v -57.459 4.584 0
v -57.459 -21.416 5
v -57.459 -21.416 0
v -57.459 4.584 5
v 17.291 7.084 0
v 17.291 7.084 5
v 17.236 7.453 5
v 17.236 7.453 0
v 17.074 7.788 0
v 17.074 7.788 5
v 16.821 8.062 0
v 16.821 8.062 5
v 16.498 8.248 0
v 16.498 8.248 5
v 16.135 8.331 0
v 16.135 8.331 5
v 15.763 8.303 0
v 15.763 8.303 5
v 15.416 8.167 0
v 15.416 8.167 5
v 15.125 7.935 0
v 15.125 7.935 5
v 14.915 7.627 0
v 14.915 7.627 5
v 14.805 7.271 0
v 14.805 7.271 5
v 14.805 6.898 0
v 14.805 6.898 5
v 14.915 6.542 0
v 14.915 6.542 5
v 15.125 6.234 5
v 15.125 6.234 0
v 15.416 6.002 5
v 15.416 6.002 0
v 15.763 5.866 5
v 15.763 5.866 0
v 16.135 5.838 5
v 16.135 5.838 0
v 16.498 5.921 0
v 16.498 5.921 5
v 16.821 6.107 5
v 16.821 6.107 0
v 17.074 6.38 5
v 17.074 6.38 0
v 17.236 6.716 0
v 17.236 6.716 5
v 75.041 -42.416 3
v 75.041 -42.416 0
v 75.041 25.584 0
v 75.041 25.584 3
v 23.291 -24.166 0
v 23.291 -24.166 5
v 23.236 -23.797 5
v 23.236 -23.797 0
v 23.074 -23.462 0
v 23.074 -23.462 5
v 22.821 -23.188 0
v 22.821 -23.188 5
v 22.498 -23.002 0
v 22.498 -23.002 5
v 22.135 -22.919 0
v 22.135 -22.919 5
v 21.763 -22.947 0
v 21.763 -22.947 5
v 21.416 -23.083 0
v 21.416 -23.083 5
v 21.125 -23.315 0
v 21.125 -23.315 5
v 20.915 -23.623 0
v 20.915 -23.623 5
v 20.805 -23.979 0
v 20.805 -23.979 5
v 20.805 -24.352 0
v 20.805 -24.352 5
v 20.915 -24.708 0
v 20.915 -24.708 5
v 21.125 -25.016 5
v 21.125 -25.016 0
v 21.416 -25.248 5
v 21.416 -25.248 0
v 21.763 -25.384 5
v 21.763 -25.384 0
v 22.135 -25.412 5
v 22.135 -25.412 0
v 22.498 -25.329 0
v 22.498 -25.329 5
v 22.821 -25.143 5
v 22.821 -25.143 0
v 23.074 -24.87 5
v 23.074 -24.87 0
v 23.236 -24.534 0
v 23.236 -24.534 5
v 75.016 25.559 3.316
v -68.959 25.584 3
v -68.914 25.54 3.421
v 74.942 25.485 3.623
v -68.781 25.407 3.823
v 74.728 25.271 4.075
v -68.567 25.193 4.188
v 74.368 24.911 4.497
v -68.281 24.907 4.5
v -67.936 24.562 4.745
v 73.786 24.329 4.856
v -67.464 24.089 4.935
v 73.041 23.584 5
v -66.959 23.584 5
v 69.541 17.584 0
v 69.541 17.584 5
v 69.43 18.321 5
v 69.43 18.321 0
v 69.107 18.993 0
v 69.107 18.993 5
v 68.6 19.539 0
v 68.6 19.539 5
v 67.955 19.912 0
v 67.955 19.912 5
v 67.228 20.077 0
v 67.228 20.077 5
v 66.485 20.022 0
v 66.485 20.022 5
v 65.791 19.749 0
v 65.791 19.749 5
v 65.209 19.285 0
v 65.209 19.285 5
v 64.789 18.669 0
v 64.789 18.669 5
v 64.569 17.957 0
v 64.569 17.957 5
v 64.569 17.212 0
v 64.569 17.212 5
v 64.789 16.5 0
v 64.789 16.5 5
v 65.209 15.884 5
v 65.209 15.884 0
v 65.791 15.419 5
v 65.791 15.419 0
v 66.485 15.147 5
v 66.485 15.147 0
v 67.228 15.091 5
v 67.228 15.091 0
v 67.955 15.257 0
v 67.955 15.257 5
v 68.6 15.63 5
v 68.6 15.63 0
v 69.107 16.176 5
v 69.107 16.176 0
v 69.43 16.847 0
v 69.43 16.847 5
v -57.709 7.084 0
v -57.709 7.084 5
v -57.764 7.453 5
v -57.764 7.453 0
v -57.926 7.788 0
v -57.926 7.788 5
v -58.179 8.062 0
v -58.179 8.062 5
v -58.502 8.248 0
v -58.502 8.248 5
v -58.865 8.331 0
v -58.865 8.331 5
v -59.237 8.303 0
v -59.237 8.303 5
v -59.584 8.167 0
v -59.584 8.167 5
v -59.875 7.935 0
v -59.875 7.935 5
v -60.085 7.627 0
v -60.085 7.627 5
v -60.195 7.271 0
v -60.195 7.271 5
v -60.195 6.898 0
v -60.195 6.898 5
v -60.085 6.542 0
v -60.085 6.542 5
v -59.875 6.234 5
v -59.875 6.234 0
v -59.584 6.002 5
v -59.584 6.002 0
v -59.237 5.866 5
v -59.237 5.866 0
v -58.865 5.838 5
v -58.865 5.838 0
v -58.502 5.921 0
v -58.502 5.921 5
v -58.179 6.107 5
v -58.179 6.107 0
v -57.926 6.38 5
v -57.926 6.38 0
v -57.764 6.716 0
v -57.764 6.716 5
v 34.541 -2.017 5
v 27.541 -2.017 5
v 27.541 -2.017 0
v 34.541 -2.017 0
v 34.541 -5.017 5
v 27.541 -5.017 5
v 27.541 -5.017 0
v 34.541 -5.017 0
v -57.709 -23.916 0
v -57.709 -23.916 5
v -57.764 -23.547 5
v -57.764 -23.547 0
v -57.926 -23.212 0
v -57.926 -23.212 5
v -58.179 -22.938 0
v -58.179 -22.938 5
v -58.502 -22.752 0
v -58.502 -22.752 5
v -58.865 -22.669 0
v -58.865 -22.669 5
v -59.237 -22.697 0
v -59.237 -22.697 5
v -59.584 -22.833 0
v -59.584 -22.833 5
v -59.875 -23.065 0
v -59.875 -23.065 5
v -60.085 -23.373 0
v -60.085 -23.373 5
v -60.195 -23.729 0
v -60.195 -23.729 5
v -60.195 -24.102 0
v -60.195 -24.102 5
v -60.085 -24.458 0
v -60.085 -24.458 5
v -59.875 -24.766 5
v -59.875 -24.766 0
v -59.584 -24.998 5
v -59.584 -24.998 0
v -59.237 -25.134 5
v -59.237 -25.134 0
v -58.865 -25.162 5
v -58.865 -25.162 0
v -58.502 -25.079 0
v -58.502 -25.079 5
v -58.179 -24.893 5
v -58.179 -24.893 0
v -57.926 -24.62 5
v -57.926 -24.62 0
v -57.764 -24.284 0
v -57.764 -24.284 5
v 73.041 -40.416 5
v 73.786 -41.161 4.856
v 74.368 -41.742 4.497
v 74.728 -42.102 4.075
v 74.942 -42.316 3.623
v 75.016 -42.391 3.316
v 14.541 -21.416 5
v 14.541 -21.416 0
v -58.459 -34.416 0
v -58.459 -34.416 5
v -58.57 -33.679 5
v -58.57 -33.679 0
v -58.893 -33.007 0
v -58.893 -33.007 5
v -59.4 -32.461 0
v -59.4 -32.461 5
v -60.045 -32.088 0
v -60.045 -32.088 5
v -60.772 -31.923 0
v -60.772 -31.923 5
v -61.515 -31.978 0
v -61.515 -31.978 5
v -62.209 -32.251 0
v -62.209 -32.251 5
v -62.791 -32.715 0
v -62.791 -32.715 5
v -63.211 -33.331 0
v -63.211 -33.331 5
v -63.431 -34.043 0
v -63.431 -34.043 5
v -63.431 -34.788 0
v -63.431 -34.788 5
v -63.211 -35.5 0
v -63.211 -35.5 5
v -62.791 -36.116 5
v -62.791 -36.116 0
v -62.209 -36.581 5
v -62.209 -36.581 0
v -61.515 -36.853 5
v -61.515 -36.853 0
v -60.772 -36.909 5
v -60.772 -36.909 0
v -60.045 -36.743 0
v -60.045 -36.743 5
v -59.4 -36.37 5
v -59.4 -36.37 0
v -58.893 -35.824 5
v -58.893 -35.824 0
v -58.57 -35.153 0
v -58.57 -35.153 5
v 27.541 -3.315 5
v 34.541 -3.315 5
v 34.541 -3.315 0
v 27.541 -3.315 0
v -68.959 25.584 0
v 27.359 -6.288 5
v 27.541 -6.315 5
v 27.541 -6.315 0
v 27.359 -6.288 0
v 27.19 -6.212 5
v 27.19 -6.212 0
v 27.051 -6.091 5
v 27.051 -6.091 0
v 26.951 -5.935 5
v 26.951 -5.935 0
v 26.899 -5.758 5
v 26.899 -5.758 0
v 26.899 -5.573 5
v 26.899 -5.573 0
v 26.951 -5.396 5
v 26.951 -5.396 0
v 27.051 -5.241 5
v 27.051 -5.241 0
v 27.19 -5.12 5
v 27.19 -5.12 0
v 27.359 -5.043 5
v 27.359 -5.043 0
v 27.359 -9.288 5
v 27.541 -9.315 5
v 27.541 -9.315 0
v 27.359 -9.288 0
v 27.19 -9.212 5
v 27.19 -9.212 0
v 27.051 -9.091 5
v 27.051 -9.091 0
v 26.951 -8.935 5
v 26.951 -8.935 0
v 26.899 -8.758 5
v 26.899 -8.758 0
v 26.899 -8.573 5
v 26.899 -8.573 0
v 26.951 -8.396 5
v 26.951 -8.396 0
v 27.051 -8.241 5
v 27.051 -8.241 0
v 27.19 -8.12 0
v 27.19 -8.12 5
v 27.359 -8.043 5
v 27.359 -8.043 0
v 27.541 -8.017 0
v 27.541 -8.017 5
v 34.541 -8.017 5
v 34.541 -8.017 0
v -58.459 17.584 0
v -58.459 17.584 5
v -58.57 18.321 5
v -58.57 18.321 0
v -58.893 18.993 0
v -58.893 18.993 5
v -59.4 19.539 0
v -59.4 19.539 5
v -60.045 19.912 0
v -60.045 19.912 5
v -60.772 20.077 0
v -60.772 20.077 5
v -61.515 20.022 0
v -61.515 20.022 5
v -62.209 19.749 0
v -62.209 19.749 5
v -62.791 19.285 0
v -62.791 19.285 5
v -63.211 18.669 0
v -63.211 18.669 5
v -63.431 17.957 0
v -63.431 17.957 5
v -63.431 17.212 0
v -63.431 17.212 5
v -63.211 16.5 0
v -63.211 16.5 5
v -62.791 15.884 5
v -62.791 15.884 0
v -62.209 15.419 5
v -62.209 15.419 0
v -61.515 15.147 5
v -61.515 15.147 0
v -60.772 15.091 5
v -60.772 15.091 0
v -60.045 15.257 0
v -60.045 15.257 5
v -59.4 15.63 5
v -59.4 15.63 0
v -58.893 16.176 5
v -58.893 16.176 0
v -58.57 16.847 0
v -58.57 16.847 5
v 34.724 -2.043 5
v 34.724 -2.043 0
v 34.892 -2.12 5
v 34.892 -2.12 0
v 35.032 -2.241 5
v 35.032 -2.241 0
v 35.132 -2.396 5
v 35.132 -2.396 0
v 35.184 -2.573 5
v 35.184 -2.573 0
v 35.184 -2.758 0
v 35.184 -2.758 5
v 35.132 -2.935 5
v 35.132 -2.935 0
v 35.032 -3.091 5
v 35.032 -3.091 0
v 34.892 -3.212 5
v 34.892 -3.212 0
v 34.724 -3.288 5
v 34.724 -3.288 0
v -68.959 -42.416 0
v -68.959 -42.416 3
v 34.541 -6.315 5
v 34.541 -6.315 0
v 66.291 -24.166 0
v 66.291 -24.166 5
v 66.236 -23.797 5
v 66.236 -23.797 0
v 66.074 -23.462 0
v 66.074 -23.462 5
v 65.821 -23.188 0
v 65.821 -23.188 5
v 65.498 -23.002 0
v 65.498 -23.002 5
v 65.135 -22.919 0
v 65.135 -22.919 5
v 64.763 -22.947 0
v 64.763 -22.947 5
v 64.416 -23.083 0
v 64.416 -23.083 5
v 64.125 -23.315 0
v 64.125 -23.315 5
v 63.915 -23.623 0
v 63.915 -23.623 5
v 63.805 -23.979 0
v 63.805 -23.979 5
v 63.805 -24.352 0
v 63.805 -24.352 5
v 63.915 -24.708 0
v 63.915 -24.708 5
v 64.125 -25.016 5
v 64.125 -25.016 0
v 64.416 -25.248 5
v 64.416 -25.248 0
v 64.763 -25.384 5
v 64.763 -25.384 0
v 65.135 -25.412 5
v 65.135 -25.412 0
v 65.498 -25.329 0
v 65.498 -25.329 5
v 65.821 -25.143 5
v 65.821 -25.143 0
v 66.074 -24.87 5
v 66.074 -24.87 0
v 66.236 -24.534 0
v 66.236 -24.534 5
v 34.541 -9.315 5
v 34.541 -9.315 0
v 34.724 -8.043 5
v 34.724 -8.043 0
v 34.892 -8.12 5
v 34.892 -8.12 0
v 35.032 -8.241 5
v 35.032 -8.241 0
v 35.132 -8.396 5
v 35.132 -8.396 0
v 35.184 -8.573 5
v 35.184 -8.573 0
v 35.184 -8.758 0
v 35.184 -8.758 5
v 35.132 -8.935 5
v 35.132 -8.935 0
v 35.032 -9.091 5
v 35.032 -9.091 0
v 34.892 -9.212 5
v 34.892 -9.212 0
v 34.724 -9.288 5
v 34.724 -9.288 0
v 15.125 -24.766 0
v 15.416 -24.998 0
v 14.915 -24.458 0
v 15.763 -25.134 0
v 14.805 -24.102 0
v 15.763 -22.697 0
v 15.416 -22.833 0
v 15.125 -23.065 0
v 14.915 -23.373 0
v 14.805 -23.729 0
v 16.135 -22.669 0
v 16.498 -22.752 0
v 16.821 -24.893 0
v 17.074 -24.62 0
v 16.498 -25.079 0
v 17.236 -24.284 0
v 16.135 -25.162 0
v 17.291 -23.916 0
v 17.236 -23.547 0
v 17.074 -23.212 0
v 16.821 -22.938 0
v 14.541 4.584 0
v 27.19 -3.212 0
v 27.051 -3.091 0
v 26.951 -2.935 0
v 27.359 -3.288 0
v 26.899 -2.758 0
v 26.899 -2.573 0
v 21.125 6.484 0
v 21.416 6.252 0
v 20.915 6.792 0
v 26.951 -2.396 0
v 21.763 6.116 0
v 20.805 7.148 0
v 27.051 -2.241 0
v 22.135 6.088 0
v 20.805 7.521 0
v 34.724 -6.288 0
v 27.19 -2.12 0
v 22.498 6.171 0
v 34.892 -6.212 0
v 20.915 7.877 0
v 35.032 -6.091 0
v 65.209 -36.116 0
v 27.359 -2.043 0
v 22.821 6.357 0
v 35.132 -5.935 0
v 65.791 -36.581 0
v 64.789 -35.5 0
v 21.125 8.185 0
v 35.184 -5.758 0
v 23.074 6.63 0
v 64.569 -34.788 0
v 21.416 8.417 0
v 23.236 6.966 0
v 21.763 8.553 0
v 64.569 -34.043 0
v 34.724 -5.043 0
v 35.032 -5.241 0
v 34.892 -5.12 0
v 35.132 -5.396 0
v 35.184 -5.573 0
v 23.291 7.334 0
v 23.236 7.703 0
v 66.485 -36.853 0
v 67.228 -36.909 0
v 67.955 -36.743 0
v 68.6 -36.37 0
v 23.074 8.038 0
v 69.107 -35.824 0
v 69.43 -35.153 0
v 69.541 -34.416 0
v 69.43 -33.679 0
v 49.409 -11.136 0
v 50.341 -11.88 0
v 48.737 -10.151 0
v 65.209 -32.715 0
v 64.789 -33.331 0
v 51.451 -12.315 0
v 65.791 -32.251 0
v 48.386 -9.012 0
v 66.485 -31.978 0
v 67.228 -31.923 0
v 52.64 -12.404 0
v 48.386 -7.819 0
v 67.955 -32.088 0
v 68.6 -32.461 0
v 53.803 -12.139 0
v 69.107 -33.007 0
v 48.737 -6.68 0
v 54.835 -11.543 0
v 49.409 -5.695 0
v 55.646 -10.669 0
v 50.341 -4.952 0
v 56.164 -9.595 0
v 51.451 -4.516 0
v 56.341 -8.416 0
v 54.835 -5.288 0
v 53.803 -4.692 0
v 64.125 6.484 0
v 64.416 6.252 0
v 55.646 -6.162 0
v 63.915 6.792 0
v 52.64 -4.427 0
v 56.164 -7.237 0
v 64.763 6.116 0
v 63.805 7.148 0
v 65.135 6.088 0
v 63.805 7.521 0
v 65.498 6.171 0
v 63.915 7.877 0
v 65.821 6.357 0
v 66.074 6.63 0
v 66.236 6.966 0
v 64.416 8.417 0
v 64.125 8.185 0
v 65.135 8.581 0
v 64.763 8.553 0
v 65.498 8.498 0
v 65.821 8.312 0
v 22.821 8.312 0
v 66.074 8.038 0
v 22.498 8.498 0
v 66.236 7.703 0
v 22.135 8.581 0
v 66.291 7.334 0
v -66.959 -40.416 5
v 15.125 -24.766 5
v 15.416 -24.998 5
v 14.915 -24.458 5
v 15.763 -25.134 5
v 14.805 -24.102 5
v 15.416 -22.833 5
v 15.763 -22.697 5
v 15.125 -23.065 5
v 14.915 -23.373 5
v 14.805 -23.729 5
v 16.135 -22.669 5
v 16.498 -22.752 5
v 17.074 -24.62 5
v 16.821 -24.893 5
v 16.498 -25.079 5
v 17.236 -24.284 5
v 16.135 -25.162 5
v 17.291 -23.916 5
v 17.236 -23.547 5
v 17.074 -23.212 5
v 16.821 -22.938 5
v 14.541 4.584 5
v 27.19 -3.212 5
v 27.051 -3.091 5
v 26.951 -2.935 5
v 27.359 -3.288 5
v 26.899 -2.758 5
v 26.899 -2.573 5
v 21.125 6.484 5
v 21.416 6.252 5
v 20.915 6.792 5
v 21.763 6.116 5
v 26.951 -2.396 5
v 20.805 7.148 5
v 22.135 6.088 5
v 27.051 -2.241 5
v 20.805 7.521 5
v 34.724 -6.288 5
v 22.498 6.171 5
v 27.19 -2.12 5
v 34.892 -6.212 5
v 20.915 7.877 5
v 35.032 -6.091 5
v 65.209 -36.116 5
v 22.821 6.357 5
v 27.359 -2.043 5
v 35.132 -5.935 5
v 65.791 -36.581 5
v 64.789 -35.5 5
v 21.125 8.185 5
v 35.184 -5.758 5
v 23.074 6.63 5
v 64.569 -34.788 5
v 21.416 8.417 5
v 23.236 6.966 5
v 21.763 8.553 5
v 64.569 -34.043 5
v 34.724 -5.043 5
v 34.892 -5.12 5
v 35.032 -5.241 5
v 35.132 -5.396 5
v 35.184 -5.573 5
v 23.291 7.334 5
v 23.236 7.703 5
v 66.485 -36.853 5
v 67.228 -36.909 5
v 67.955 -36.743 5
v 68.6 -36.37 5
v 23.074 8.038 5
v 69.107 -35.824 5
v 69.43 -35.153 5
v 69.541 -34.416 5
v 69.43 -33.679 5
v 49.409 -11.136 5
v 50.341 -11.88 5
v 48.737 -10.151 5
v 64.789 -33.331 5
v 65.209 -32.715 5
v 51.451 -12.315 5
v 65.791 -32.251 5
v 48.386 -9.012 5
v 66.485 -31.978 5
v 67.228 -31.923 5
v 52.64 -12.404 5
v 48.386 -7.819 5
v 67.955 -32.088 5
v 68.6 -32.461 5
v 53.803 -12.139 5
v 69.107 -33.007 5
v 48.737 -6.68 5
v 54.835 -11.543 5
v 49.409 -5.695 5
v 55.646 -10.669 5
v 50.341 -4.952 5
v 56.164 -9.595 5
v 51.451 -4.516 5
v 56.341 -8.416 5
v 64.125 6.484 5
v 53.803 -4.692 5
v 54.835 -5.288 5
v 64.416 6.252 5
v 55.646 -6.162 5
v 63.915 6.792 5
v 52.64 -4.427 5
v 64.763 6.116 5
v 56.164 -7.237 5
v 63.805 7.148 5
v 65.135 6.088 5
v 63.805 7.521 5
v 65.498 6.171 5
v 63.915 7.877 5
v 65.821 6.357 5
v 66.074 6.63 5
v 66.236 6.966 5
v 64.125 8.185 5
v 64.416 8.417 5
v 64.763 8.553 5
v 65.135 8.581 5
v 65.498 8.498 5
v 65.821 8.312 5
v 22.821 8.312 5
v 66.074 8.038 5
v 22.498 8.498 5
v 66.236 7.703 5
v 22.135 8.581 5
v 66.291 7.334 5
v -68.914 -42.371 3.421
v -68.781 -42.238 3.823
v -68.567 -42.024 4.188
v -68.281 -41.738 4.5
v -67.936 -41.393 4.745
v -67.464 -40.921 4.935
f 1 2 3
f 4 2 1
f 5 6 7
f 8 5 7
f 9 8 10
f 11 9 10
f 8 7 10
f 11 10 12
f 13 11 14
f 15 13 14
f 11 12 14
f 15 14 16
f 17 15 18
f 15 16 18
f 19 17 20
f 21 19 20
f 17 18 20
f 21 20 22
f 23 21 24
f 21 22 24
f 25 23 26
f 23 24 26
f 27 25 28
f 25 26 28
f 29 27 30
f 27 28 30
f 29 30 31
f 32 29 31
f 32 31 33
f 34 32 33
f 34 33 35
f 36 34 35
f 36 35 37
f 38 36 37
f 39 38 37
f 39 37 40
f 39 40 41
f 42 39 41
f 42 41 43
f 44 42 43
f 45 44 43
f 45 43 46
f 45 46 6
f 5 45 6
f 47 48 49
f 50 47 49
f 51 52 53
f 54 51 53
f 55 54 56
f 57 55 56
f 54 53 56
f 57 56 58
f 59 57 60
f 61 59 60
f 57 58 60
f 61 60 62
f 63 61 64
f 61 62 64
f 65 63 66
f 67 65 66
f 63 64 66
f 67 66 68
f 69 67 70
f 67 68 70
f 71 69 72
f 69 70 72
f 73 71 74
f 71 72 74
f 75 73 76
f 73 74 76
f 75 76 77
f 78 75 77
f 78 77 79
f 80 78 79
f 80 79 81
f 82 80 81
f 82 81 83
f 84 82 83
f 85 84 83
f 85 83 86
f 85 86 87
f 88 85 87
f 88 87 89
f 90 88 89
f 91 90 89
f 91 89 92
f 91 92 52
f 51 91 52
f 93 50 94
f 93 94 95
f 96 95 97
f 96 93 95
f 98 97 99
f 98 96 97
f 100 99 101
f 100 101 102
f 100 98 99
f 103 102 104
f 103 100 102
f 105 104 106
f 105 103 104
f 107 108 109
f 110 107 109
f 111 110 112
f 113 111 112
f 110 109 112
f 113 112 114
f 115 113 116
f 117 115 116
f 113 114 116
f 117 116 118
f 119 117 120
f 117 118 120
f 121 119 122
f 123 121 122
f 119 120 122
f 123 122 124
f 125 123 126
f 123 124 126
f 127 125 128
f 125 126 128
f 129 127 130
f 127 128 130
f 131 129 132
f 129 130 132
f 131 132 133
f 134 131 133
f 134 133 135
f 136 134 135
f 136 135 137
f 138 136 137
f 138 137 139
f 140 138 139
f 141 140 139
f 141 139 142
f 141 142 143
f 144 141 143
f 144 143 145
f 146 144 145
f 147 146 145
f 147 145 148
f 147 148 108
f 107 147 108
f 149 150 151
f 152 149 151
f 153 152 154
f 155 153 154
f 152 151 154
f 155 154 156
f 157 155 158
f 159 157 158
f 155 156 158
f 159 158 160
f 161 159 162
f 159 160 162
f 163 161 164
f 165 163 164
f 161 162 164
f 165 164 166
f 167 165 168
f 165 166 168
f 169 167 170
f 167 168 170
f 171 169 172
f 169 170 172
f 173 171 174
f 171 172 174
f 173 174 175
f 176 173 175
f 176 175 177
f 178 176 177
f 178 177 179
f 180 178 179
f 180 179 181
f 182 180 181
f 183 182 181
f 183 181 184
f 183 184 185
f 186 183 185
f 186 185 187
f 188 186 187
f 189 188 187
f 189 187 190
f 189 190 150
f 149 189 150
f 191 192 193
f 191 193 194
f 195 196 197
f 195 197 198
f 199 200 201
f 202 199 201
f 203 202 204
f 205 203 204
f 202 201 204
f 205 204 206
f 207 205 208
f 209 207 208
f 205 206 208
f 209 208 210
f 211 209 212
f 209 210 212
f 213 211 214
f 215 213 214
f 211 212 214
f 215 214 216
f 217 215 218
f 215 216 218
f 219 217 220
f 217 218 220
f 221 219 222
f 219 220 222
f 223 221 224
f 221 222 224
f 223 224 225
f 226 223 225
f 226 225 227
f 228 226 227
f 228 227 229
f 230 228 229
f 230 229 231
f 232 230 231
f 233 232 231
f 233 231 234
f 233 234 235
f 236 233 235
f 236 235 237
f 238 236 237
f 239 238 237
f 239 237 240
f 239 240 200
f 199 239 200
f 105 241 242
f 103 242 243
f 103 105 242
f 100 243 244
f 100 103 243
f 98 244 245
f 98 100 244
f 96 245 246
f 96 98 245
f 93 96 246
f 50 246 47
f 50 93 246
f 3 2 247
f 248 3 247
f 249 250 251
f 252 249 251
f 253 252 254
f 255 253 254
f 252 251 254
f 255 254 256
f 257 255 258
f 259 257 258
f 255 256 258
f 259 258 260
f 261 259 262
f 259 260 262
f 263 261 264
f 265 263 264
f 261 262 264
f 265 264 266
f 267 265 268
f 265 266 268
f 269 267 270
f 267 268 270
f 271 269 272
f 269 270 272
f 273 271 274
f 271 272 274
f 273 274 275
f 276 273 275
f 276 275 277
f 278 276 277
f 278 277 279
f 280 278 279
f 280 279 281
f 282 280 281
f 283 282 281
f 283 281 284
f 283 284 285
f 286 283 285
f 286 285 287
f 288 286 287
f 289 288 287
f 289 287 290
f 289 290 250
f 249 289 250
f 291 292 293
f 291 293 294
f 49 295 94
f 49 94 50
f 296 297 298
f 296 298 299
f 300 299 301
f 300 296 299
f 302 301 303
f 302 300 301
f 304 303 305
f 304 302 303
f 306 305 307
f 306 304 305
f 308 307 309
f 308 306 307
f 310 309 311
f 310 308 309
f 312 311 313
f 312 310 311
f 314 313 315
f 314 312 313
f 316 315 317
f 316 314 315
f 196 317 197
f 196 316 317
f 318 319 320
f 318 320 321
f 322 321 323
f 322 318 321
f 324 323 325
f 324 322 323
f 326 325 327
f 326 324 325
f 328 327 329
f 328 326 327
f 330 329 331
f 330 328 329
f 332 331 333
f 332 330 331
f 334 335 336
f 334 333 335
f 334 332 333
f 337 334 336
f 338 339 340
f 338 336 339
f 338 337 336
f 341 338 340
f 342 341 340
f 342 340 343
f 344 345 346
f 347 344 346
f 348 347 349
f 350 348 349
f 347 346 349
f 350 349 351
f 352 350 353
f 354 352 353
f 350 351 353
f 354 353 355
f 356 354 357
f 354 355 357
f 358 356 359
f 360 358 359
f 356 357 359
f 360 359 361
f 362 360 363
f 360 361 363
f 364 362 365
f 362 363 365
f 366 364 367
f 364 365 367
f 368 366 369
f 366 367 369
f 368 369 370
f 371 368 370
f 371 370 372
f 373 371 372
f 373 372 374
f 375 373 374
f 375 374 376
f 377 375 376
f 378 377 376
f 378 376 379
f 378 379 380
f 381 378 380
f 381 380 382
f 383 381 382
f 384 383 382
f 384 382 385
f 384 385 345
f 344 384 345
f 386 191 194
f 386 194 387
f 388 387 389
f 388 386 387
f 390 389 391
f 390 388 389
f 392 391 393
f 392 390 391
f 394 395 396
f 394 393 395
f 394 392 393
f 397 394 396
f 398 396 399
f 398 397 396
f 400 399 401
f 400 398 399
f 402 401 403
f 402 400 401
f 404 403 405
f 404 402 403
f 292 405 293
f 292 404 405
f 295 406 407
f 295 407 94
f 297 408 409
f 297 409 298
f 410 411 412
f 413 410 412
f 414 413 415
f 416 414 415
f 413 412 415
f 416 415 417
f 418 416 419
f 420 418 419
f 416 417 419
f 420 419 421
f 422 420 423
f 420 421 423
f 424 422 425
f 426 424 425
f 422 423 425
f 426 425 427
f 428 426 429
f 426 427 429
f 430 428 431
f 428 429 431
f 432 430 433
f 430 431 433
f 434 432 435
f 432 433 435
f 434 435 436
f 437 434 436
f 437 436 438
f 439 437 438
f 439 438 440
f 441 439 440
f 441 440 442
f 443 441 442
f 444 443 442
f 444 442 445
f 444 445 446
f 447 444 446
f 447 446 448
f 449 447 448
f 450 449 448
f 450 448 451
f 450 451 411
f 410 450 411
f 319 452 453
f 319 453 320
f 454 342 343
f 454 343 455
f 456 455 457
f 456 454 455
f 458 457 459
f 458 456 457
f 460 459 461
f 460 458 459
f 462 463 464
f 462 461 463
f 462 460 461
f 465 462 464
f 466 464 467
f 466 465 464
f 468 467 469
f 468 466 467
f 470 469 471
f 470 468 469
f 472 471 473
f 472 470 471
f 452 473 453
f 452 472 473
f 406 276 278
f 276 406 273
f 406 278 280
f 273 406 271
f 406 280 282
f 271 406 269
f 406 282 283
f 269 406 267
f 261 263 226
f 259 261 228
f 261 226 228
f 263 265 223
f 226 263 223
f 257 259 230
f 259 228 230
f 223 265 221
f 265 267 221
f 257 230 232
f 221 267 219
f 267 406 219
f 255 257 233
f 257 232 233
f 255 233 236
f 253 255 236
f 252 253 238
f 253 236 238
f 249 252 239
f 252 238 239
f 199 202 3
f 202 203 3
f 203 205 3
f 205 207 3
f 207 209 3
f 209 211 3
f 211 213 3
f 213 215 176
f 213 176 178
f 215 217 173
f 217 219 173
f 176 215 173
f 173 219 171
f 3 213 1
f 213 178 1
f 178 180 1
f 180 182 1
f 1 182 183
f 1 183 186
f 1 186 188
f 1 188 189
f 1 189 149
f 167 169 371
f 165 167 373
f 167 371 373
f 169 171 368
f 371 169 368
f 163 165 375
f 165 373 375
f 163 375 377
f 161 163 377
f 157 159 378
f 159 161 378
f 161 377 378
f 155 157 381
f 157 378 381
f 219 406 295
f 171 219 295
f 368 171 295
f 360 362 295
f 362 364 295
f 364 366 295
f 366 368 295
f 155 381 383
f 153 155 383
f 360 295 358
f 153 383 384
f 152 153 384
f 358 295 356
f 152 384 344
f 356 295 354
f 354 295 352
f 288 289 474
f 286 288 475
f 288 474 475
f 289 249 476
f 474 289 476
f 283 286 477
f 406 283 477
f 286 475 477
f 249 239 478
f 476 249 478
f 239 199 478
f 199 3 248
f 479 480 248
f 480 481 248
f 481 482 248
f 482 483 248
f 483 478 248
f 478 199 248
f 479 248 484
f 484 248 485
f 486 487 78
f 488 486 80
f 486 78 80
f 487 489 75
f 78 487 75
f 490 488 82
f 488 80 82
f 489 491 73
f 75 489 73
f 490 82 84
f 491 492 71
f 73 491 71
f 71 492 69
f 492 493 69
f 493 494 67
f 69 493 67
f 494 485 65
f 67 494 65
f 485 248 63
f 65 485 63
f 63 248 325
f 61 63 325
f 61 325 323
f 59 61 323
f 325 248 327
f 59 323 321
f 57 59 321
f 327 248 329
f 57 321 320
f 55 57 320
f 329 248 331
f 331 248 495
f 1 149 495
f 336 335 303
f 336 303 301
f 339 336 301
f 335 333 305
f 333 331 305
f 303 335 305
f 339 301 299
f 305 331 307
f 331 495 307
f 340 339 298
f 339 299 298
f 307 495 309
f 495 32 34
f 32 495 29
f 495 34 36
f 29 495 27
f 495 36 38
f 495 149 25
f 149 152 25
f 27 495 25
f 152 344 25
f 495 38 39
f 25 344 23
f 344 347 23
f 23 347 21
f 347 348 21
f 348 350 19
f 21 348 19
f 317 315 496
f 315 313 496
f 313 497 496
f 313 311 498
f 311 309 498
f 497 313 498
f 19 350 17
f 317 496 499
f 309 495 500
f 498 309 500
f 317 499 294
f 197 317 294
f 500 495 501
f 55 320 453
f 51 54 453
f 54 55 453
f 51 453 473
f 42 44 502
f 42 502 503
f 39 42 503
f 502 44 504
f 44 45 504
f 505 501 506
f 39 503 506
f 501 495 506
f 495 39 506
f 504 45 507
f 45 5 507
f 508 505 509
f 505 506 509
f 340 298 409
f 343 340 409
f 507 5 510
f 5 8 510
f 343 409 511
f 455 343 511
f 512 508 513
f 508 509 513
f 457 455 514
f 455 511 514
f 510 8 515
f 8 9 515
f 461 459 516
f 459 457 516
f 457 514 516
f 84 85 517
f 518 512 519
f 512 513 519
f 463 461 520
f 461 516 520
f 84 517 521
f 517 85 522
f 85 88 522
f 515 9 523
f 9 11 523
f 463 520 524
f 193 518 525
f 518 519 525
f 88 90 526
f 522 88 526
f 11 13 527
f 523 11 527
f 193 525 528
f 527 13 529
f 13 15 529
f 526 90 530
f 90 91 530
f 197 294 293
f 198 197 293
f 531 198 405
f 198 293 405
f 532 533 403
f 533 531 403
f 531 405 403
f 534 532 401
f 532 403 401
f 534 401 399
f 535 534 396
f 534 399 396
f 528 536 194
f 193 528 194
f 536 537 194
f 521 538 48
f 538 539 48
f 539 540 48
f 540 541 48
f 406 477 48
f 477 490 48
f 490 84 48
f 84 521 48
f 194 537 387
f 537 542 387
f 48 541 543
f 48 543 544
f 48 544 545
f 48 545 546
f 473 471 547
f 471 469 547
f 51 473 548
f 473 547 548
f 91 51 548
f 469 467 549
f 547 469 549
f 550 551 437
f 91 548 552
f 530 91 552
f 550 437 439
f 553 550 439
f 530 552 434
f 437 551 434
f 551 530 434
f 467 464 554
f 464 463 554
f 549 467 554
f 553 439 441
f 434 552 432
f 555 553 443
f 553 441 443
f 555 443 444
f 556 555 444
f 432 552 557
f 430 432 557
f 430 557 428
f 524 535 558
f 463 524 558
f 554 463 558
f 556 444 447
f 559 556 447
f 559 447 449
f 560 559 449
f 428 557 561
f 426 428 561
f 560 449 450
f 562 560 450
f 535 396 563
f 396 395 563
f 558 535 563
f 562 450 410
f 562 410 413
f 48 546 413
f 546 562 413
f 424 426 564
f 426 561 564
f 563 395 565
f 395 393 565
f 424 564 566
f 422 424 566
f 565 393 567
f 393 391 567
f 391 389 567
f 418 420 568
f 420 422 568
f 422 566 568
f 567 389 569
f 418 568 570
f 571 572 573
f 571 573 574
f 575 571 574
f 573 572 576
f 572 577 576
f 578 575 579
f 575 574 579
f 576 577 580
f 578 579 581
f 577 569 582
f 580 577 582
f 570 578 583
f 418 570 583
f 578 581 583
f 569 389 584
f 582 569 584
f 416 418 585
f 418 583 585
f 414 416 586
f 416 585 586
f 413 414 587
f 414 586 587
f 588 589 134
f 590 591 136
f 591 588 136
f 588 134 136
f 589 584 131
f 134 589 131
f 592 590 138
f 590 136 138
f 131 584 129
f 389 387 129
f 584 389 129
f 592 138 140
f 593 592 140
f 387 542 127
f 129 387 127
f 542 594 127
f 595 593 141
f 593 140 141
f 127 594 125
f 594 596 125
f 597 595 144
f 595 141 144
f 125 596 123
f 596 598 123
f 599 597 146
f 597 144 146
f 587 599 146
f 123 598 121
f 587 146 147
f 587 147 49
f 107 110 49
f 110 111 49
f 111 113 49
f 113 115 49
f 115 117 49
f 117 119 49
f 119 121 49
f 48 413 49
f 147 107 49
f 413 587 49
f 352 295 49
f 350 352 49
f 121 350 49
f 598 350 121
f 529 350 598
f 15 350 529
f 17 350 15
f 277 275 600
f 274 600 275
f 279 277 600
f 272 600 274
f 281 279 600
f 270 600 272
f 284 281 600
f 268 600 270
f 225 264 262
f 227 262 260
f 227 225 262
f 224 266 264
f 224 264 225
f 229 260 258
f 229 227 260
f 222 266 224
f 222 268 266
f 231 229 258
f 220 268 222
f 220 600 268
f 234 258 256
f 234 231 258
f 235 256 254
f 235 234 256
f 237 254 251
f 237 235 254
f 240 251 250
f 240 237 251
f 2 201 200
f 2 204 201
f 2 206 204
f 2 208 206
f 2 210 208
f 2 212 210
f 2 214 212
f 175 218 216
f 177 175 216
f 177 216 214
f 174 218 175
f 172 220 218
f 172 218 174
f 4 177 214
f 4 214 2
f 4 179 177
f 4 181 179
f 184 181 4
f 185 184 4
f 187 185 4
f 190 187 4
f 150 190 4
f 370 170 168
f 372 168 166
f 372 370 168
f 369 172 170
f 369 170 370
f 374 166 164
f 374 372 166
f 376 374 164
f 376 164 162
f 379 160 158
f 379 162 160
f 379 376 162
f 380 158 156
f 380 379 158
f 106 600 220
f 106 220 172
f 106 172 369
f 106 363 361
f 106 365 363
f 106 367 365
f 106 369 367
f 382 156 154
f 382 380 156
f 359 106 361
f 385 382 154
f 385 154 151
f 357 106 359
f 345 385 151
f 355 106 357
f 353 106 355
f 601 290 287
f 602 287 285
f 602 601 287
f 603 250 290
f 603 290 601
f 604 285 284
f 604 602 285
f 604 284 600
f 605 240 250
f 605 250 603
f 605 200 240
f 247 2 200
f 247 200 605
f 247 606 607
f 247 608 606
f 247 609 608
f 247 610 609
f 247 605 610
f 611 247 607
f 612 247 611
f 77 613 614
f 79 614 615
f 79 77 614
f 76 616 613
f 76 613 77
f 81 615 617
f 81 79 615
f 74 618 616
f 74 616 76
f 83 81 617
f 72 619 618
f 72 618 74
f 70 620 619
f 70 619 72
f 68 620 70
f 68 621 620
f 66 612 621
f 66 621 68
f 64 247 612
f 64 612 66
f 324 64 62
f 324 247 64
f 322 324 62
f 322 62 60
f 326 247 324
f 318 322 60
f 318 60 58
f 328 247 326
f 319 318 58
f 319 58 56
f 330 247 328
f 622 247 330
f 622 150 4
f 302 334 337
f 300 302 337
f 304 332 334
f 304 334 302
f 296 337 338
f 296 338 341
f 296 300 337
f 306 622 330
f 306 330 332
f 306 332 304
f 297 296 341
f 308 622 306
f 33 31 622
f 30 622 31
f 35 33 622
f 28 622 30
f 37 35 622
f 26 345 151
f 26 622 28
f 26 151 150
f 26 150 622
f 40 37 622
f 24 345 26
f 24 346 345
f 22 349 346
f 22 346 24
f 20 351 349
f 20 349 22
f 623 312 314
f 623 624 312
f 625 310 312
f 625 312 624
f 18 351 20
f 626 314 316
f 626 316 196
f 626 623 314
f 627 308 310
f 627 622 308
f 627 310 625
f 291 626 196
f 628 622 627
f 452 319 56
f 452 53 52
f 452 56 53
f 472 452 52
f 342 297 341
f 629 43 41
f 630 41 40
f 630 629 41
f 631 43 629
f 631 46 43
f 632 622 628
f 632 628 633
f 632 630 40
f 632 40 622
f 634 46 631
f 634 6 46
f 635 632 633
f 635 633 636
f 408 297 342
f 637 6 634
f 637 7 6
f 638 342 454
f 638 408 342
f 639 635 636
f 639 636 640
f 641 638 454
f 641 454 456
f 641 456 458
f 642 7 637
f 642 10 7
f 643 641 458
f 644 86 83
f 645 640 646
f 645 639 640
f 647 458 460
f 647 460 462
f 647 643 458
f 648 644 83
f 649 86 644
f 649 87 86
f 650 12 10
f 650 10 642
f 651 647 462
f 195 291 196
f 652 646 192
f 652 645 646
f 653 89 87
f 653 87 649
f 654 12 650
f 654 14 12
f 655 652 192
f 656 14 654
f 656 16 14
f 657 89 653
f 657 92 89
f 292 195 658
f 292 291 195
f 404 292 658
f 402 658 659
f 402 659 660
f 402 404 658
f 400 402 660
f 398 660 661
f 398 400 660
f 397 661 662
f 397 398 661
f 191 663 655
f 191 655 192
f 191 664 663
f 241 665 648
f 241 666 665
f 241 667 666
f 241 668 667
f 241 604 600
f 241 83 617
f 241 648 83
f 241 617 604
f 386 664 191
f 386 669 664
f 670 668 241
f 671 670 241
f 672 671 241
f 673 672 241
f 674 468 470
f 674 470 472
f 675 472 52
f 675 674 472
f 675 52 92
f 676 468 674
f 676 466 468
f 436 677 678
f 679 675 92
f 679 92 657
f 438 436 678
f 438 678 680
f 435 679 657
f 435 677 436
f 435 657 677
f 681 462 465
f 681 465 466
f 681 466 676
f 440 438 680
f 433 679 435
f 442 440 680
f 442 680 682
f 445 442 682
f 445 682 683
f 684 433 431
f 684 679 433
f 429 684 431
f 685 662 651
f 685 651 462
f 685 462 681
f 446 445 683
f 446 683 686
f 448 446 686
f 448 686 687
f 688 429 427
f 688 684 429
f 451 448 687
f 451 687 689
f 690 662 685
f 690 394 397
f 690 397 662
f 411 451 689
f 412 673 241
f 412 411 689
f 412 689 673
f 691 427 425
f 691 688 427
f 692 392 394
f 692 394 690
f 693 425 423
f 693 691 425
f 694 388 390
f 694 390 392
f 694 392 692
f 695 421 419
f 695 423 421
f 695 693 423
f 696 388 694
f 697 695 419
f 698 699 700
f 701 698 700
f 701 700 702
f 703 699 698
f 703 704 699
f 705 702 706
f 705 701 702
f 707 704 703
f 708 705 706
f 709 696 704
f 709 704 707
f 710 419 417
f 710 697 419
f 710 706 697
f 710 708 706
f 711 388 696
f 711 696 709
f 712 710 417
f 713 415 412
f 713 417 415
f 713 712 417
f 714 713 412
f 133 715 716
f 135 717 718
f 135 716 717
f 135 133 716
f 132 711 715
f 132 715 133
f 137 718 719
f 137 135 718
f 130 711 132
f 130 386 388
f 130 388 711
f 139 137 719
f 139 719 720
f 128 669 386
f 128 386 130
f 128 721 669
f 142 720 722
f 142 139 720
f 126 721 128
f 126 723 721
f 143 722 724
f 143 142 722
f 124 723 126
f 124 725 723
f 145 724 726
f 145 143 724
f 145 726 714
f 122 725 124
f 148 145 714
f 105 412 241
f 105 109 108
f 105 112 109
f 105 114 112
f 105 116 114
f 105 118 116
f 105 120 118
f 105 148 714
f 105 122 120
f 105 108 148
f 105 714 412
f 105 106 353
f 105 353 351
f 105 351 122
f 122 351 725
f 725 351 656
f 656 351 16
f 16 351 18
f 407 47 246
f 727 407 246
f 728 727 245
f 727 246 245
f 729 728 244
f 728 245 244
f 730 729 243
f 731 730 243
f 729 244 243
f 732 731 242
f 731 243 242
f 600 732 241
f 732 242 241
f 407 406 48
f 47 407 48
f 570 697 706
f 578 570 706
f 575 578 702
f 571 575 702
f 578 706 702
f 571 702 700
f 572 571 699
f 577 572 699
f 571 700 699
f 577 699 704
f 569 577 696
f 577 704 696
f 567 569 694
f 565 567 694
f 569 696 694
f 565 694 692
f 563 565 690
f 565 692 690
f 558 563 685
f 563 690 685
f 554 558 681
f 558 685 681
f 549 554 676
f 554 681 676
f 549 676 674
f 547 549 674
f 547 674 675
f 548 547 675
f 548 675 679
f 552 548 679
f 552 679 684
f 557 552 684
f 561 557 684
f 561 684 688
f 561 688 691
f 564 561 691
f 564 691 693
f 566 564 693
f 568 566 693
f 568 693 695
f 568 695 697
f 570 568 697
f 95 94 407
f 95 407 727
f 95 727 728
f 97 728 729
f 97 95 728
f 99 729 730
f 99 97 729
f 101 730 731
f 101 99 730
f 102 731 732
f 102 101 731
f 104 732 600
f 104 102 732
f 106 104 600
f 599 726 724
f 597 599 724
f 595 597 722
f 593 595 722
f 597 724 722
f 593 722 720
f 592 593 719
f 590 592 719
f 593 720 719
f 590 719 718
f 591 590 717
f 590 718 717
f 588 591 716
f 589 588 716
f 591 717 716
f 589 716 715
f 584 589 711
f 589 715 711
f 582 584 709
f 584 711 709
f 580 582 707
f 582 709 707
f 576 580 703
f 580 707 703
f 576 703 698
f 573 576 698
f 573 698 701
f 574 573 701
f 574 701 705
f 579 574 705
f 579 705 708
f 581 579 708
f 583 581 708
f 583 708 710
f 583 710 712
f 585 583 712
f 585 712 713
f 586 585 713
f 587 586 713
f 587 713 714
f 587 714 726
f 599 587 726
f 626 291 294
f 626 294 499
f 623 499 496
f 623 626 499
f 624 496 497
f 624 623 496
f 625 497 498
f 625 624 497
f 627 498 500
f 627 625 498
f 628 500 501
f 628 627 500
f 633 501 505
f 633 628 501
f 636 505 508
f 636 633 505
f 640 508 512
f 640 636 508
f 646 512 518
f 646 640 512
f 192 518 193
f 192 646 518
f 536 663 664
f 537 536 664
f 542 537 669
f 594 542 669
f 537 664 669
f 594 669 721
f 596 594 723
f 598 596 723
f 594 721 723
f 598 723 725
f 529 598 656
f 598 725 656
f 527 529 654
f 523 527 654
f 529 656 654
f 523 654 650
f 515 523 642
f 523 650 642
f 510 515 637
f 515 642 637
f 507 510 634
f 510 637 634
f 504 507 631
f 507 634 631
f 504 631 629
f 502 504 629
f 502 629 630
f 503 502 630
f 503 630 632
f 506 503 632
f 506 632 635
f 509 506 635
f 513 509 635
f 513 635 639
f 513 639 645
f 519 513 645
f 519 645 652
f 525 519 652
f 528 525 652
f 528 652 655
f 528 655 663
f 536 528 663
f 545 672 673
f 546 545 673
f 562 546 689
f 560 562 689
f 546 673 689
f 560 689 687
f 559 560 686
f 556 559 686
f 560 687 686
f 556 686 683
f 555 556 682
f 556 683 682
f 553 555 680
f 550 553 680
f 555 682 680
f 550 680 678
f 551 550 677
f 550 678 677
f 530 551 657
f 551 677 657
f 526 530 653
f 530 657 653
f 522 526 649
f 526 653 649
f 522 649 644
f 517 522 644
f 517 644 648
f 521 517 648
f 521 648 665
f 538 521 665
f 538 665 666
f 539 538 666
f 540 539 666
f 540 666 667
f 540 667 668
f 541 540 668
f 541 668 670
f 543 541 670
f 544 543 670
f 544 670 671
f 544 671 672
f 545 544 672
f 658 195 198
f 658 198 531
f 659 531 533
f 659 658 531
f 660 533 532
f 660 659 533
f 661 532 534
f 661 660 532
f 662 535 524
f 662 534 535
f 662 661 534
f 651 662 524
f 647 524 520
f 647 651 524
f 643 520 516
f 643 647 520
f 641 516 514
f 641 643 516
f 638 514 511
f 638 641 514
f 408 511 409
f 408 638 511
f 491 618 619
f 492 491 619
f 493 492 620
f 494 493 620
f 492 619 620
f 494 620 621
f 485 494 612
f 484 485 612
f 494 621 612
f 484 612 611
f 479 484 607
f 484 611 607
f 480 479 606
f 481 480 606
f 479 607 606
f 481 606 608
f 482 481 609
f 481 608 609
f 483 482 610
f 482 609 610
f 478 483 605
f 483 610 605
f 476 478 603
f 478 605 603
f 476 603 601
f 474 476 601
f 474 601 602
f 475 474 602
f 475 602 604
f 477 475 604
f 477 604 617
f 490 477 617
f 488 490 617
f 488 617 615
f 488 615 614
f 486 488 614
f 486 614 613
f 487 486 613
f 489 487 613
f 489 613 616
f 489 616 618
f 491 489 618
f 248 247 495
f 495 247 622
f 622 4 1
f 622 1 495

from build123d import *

# Parameters (mm, degrees)
SKETCH_1_W          = 144
SKETCH_1_H          = 68
EXTRUDE_1_DEPTH     = 5
SKETCH_2_R          = 1.25
CUT_EXTRUDE_1_DEPTH = 87.344031922
SKETCH_3_W          = 72
SKETCH_3_H          = 26
CUT_EXTRUDE_2_DEPTH = 87.344031922
SKETCH_5_R          = 1.25
CUT_EXTRUDE_3_DEPTH = 87.344031922
CUT_EXTRUDE_4_DEPTH = 87.344031922
SKETCH_7_R          = 4
CUT_EXTRUDE_5_DEPTH = 87.344031922
SKETCH_8_R          = 2.5
CUT_EXTRUDE_6_DEPTH = 87.344031922
FILLET_1_R          = 2


with BuildPart() as part:
    # Эскиз1 → Бобышка-Вытянуть1 (new body)
    with BuildSketch(Plane.XY):
        with Locations((3.041351056, -8.41565136)):
            Rectangle(SKETCH_1_W, SKETCH_1_H)
    extrude(amount=EXTRUDE_1_DEPTH)

    # Эскиз2 → Вырез-Вытянуть1 (cut, through all)
    with BuildSketch(Plane.XY.offset(5)):
        with Locations((-58.958648944, 7.08434864)):
            Circle(SKETCH_2_R)
        with Locations((-58.958648944, -23.91565136)):
            Circle(SKETCH_2_R)
        with Locations((16.041351056, 7.08434864)):
            Circle(SKETCH_2_R)
        with Locations((16.041351056, -23.91565136)):
            Circle(SKETCH_2_R)
    extrude(amount=-CUT_EXTRUDE_1_DEPTH, mode=Mode.SUBTRACT)

    # Эскиз3 → Вырез-Вытянуть2 (cut, through all)
    with BuildSketch(Plane.XY.offset(5)):
        with Locations((-21.458648944, -8.41565136)):
            Rectangle(SKETCH_3_W, SKETCH_3_H)
    extrude(amount=-CUT_EXTRUDE_2_DEPTH, mode=Mode.SUBTRACT)

    # Эскиз5 → Вырез-Вытянуть3 (cut, through all)
    with BuildSketch(Plane.XY.offset(5)):
        with Locations((22.041351056, -24.16565136)):
            Circle(SKETCH_5_R)
        with Locations((65.041351056, -24.16565136)):
            Circle(SKETCH_5_R)
        with Locations((65.041351056, 7.33434864)):
            Circle(SKETCH_5_R)
        with Locations((22.041351056, 7.33434864)):
            Circle(SKETCH_5_R)
    extrude(amount=-CUT_EXTRUDE_3_DEPTH, mode=Mode.SUBTRACT)

    # Эскиз6 → Вырез-Вытянуть4 (cut, through all)
    with BuildSketch(Plane.XY.offset(5)):
        with BuildLine():
            Line((27.541351056, -8.016688712), (34.541351056, -8.016688712))
            ThreePointArc((34.541351056, -8.016688712), (35.190313704, -8.66565136), (34.541351056, -9.314614008))
            Line((34.541351056, -9.314614008), (27.541351056, -9.314614008))
            ThreePointArc((27.541351056, -9.314614008), (26.892388408, -8.66565136), (27.541351056, -8.016688712))
        make_face()
        with BuildLine():
            Line((27.541351056, -5.016688712), (34.541351056, -5.016688712))
            ThreePointArc((34.541351056, -5.016688712), (35.190313704, -5.66565136), (34.541351056, -6.314614008))
            Line((34.541351056, -6.314614008), (27.541351056, -6.314614008))
            ThreePointArc((27.541351056, -6.314614008), (26.892388408, -5.66565136), (27.541351056, -5.016688712))
        make_face()
        with BuildLine():
            Line((27.541351056, -2.016688712), (34.541351056, -2.016688712))
            ThreePointArc((34.541351056, -2.016688712), (35.190313704, -2.66565136), (34.541351056, -3.314614008))
            Line((34.541351056, -3.314614008), (27.541351056, -3.314614008))
            ThreePointArc((27.541351056, -3.314614008), (26.892388408, -2.66565136), (27.541351056, -2.016688712))
        make_face()
    extrude(amount=-CUT_EXTRUDE_4_DEPTH, mode=Mode.SUBTRACT)

    # Эскиз7 → Вырез-Вытянуть5 (cut, through all)
    with BuildSketch(Plane.XY.offset(5)):
        with Locations((52.341351056, -8.41565136)):
            Circle(SKETCH_7_R)
    extrude(amount=-CUT_EXTRUDE_5_DEPTH, mode=Mode.SUBTRACT)

    # Эскиз8 → Вырез-Вытянуть6 (cut, through all)
    with BuildSketch(Plane.XY.offset(5)):
        with Locations((-60.958648944, 17.58434864)):
            Circle(SKETCH_8_R)
        with Locations((67.041351056, 17.58434864)):
            Circle(SKETCH_8_R)
        with Locations((67.041351056, -34.41565136)):
            Circle(SKETCH_8_R)
        with Locations((-60.958648944, -34.41565136)):
            Circle(SKETCH_8_R)
    extrude(amount=-CUT_EXTRUDE_6_DEPTH, mode=Mode.SUBTRACT)

    # Скругление1
    fillet_1_edges = [part.edges().sort_by_distance(p)[0] for p in [
        (75.041351056, -8.41565136, 5),
        (3.041351056, 25.58434864, 5),
        (-68.958648944, -8.41565136, 5),
        (3.041351056, -42.41565136, 5),
    ]]
    fillet(fillet_1_edges, radius=FILLET_1_R)


solid = part.part
